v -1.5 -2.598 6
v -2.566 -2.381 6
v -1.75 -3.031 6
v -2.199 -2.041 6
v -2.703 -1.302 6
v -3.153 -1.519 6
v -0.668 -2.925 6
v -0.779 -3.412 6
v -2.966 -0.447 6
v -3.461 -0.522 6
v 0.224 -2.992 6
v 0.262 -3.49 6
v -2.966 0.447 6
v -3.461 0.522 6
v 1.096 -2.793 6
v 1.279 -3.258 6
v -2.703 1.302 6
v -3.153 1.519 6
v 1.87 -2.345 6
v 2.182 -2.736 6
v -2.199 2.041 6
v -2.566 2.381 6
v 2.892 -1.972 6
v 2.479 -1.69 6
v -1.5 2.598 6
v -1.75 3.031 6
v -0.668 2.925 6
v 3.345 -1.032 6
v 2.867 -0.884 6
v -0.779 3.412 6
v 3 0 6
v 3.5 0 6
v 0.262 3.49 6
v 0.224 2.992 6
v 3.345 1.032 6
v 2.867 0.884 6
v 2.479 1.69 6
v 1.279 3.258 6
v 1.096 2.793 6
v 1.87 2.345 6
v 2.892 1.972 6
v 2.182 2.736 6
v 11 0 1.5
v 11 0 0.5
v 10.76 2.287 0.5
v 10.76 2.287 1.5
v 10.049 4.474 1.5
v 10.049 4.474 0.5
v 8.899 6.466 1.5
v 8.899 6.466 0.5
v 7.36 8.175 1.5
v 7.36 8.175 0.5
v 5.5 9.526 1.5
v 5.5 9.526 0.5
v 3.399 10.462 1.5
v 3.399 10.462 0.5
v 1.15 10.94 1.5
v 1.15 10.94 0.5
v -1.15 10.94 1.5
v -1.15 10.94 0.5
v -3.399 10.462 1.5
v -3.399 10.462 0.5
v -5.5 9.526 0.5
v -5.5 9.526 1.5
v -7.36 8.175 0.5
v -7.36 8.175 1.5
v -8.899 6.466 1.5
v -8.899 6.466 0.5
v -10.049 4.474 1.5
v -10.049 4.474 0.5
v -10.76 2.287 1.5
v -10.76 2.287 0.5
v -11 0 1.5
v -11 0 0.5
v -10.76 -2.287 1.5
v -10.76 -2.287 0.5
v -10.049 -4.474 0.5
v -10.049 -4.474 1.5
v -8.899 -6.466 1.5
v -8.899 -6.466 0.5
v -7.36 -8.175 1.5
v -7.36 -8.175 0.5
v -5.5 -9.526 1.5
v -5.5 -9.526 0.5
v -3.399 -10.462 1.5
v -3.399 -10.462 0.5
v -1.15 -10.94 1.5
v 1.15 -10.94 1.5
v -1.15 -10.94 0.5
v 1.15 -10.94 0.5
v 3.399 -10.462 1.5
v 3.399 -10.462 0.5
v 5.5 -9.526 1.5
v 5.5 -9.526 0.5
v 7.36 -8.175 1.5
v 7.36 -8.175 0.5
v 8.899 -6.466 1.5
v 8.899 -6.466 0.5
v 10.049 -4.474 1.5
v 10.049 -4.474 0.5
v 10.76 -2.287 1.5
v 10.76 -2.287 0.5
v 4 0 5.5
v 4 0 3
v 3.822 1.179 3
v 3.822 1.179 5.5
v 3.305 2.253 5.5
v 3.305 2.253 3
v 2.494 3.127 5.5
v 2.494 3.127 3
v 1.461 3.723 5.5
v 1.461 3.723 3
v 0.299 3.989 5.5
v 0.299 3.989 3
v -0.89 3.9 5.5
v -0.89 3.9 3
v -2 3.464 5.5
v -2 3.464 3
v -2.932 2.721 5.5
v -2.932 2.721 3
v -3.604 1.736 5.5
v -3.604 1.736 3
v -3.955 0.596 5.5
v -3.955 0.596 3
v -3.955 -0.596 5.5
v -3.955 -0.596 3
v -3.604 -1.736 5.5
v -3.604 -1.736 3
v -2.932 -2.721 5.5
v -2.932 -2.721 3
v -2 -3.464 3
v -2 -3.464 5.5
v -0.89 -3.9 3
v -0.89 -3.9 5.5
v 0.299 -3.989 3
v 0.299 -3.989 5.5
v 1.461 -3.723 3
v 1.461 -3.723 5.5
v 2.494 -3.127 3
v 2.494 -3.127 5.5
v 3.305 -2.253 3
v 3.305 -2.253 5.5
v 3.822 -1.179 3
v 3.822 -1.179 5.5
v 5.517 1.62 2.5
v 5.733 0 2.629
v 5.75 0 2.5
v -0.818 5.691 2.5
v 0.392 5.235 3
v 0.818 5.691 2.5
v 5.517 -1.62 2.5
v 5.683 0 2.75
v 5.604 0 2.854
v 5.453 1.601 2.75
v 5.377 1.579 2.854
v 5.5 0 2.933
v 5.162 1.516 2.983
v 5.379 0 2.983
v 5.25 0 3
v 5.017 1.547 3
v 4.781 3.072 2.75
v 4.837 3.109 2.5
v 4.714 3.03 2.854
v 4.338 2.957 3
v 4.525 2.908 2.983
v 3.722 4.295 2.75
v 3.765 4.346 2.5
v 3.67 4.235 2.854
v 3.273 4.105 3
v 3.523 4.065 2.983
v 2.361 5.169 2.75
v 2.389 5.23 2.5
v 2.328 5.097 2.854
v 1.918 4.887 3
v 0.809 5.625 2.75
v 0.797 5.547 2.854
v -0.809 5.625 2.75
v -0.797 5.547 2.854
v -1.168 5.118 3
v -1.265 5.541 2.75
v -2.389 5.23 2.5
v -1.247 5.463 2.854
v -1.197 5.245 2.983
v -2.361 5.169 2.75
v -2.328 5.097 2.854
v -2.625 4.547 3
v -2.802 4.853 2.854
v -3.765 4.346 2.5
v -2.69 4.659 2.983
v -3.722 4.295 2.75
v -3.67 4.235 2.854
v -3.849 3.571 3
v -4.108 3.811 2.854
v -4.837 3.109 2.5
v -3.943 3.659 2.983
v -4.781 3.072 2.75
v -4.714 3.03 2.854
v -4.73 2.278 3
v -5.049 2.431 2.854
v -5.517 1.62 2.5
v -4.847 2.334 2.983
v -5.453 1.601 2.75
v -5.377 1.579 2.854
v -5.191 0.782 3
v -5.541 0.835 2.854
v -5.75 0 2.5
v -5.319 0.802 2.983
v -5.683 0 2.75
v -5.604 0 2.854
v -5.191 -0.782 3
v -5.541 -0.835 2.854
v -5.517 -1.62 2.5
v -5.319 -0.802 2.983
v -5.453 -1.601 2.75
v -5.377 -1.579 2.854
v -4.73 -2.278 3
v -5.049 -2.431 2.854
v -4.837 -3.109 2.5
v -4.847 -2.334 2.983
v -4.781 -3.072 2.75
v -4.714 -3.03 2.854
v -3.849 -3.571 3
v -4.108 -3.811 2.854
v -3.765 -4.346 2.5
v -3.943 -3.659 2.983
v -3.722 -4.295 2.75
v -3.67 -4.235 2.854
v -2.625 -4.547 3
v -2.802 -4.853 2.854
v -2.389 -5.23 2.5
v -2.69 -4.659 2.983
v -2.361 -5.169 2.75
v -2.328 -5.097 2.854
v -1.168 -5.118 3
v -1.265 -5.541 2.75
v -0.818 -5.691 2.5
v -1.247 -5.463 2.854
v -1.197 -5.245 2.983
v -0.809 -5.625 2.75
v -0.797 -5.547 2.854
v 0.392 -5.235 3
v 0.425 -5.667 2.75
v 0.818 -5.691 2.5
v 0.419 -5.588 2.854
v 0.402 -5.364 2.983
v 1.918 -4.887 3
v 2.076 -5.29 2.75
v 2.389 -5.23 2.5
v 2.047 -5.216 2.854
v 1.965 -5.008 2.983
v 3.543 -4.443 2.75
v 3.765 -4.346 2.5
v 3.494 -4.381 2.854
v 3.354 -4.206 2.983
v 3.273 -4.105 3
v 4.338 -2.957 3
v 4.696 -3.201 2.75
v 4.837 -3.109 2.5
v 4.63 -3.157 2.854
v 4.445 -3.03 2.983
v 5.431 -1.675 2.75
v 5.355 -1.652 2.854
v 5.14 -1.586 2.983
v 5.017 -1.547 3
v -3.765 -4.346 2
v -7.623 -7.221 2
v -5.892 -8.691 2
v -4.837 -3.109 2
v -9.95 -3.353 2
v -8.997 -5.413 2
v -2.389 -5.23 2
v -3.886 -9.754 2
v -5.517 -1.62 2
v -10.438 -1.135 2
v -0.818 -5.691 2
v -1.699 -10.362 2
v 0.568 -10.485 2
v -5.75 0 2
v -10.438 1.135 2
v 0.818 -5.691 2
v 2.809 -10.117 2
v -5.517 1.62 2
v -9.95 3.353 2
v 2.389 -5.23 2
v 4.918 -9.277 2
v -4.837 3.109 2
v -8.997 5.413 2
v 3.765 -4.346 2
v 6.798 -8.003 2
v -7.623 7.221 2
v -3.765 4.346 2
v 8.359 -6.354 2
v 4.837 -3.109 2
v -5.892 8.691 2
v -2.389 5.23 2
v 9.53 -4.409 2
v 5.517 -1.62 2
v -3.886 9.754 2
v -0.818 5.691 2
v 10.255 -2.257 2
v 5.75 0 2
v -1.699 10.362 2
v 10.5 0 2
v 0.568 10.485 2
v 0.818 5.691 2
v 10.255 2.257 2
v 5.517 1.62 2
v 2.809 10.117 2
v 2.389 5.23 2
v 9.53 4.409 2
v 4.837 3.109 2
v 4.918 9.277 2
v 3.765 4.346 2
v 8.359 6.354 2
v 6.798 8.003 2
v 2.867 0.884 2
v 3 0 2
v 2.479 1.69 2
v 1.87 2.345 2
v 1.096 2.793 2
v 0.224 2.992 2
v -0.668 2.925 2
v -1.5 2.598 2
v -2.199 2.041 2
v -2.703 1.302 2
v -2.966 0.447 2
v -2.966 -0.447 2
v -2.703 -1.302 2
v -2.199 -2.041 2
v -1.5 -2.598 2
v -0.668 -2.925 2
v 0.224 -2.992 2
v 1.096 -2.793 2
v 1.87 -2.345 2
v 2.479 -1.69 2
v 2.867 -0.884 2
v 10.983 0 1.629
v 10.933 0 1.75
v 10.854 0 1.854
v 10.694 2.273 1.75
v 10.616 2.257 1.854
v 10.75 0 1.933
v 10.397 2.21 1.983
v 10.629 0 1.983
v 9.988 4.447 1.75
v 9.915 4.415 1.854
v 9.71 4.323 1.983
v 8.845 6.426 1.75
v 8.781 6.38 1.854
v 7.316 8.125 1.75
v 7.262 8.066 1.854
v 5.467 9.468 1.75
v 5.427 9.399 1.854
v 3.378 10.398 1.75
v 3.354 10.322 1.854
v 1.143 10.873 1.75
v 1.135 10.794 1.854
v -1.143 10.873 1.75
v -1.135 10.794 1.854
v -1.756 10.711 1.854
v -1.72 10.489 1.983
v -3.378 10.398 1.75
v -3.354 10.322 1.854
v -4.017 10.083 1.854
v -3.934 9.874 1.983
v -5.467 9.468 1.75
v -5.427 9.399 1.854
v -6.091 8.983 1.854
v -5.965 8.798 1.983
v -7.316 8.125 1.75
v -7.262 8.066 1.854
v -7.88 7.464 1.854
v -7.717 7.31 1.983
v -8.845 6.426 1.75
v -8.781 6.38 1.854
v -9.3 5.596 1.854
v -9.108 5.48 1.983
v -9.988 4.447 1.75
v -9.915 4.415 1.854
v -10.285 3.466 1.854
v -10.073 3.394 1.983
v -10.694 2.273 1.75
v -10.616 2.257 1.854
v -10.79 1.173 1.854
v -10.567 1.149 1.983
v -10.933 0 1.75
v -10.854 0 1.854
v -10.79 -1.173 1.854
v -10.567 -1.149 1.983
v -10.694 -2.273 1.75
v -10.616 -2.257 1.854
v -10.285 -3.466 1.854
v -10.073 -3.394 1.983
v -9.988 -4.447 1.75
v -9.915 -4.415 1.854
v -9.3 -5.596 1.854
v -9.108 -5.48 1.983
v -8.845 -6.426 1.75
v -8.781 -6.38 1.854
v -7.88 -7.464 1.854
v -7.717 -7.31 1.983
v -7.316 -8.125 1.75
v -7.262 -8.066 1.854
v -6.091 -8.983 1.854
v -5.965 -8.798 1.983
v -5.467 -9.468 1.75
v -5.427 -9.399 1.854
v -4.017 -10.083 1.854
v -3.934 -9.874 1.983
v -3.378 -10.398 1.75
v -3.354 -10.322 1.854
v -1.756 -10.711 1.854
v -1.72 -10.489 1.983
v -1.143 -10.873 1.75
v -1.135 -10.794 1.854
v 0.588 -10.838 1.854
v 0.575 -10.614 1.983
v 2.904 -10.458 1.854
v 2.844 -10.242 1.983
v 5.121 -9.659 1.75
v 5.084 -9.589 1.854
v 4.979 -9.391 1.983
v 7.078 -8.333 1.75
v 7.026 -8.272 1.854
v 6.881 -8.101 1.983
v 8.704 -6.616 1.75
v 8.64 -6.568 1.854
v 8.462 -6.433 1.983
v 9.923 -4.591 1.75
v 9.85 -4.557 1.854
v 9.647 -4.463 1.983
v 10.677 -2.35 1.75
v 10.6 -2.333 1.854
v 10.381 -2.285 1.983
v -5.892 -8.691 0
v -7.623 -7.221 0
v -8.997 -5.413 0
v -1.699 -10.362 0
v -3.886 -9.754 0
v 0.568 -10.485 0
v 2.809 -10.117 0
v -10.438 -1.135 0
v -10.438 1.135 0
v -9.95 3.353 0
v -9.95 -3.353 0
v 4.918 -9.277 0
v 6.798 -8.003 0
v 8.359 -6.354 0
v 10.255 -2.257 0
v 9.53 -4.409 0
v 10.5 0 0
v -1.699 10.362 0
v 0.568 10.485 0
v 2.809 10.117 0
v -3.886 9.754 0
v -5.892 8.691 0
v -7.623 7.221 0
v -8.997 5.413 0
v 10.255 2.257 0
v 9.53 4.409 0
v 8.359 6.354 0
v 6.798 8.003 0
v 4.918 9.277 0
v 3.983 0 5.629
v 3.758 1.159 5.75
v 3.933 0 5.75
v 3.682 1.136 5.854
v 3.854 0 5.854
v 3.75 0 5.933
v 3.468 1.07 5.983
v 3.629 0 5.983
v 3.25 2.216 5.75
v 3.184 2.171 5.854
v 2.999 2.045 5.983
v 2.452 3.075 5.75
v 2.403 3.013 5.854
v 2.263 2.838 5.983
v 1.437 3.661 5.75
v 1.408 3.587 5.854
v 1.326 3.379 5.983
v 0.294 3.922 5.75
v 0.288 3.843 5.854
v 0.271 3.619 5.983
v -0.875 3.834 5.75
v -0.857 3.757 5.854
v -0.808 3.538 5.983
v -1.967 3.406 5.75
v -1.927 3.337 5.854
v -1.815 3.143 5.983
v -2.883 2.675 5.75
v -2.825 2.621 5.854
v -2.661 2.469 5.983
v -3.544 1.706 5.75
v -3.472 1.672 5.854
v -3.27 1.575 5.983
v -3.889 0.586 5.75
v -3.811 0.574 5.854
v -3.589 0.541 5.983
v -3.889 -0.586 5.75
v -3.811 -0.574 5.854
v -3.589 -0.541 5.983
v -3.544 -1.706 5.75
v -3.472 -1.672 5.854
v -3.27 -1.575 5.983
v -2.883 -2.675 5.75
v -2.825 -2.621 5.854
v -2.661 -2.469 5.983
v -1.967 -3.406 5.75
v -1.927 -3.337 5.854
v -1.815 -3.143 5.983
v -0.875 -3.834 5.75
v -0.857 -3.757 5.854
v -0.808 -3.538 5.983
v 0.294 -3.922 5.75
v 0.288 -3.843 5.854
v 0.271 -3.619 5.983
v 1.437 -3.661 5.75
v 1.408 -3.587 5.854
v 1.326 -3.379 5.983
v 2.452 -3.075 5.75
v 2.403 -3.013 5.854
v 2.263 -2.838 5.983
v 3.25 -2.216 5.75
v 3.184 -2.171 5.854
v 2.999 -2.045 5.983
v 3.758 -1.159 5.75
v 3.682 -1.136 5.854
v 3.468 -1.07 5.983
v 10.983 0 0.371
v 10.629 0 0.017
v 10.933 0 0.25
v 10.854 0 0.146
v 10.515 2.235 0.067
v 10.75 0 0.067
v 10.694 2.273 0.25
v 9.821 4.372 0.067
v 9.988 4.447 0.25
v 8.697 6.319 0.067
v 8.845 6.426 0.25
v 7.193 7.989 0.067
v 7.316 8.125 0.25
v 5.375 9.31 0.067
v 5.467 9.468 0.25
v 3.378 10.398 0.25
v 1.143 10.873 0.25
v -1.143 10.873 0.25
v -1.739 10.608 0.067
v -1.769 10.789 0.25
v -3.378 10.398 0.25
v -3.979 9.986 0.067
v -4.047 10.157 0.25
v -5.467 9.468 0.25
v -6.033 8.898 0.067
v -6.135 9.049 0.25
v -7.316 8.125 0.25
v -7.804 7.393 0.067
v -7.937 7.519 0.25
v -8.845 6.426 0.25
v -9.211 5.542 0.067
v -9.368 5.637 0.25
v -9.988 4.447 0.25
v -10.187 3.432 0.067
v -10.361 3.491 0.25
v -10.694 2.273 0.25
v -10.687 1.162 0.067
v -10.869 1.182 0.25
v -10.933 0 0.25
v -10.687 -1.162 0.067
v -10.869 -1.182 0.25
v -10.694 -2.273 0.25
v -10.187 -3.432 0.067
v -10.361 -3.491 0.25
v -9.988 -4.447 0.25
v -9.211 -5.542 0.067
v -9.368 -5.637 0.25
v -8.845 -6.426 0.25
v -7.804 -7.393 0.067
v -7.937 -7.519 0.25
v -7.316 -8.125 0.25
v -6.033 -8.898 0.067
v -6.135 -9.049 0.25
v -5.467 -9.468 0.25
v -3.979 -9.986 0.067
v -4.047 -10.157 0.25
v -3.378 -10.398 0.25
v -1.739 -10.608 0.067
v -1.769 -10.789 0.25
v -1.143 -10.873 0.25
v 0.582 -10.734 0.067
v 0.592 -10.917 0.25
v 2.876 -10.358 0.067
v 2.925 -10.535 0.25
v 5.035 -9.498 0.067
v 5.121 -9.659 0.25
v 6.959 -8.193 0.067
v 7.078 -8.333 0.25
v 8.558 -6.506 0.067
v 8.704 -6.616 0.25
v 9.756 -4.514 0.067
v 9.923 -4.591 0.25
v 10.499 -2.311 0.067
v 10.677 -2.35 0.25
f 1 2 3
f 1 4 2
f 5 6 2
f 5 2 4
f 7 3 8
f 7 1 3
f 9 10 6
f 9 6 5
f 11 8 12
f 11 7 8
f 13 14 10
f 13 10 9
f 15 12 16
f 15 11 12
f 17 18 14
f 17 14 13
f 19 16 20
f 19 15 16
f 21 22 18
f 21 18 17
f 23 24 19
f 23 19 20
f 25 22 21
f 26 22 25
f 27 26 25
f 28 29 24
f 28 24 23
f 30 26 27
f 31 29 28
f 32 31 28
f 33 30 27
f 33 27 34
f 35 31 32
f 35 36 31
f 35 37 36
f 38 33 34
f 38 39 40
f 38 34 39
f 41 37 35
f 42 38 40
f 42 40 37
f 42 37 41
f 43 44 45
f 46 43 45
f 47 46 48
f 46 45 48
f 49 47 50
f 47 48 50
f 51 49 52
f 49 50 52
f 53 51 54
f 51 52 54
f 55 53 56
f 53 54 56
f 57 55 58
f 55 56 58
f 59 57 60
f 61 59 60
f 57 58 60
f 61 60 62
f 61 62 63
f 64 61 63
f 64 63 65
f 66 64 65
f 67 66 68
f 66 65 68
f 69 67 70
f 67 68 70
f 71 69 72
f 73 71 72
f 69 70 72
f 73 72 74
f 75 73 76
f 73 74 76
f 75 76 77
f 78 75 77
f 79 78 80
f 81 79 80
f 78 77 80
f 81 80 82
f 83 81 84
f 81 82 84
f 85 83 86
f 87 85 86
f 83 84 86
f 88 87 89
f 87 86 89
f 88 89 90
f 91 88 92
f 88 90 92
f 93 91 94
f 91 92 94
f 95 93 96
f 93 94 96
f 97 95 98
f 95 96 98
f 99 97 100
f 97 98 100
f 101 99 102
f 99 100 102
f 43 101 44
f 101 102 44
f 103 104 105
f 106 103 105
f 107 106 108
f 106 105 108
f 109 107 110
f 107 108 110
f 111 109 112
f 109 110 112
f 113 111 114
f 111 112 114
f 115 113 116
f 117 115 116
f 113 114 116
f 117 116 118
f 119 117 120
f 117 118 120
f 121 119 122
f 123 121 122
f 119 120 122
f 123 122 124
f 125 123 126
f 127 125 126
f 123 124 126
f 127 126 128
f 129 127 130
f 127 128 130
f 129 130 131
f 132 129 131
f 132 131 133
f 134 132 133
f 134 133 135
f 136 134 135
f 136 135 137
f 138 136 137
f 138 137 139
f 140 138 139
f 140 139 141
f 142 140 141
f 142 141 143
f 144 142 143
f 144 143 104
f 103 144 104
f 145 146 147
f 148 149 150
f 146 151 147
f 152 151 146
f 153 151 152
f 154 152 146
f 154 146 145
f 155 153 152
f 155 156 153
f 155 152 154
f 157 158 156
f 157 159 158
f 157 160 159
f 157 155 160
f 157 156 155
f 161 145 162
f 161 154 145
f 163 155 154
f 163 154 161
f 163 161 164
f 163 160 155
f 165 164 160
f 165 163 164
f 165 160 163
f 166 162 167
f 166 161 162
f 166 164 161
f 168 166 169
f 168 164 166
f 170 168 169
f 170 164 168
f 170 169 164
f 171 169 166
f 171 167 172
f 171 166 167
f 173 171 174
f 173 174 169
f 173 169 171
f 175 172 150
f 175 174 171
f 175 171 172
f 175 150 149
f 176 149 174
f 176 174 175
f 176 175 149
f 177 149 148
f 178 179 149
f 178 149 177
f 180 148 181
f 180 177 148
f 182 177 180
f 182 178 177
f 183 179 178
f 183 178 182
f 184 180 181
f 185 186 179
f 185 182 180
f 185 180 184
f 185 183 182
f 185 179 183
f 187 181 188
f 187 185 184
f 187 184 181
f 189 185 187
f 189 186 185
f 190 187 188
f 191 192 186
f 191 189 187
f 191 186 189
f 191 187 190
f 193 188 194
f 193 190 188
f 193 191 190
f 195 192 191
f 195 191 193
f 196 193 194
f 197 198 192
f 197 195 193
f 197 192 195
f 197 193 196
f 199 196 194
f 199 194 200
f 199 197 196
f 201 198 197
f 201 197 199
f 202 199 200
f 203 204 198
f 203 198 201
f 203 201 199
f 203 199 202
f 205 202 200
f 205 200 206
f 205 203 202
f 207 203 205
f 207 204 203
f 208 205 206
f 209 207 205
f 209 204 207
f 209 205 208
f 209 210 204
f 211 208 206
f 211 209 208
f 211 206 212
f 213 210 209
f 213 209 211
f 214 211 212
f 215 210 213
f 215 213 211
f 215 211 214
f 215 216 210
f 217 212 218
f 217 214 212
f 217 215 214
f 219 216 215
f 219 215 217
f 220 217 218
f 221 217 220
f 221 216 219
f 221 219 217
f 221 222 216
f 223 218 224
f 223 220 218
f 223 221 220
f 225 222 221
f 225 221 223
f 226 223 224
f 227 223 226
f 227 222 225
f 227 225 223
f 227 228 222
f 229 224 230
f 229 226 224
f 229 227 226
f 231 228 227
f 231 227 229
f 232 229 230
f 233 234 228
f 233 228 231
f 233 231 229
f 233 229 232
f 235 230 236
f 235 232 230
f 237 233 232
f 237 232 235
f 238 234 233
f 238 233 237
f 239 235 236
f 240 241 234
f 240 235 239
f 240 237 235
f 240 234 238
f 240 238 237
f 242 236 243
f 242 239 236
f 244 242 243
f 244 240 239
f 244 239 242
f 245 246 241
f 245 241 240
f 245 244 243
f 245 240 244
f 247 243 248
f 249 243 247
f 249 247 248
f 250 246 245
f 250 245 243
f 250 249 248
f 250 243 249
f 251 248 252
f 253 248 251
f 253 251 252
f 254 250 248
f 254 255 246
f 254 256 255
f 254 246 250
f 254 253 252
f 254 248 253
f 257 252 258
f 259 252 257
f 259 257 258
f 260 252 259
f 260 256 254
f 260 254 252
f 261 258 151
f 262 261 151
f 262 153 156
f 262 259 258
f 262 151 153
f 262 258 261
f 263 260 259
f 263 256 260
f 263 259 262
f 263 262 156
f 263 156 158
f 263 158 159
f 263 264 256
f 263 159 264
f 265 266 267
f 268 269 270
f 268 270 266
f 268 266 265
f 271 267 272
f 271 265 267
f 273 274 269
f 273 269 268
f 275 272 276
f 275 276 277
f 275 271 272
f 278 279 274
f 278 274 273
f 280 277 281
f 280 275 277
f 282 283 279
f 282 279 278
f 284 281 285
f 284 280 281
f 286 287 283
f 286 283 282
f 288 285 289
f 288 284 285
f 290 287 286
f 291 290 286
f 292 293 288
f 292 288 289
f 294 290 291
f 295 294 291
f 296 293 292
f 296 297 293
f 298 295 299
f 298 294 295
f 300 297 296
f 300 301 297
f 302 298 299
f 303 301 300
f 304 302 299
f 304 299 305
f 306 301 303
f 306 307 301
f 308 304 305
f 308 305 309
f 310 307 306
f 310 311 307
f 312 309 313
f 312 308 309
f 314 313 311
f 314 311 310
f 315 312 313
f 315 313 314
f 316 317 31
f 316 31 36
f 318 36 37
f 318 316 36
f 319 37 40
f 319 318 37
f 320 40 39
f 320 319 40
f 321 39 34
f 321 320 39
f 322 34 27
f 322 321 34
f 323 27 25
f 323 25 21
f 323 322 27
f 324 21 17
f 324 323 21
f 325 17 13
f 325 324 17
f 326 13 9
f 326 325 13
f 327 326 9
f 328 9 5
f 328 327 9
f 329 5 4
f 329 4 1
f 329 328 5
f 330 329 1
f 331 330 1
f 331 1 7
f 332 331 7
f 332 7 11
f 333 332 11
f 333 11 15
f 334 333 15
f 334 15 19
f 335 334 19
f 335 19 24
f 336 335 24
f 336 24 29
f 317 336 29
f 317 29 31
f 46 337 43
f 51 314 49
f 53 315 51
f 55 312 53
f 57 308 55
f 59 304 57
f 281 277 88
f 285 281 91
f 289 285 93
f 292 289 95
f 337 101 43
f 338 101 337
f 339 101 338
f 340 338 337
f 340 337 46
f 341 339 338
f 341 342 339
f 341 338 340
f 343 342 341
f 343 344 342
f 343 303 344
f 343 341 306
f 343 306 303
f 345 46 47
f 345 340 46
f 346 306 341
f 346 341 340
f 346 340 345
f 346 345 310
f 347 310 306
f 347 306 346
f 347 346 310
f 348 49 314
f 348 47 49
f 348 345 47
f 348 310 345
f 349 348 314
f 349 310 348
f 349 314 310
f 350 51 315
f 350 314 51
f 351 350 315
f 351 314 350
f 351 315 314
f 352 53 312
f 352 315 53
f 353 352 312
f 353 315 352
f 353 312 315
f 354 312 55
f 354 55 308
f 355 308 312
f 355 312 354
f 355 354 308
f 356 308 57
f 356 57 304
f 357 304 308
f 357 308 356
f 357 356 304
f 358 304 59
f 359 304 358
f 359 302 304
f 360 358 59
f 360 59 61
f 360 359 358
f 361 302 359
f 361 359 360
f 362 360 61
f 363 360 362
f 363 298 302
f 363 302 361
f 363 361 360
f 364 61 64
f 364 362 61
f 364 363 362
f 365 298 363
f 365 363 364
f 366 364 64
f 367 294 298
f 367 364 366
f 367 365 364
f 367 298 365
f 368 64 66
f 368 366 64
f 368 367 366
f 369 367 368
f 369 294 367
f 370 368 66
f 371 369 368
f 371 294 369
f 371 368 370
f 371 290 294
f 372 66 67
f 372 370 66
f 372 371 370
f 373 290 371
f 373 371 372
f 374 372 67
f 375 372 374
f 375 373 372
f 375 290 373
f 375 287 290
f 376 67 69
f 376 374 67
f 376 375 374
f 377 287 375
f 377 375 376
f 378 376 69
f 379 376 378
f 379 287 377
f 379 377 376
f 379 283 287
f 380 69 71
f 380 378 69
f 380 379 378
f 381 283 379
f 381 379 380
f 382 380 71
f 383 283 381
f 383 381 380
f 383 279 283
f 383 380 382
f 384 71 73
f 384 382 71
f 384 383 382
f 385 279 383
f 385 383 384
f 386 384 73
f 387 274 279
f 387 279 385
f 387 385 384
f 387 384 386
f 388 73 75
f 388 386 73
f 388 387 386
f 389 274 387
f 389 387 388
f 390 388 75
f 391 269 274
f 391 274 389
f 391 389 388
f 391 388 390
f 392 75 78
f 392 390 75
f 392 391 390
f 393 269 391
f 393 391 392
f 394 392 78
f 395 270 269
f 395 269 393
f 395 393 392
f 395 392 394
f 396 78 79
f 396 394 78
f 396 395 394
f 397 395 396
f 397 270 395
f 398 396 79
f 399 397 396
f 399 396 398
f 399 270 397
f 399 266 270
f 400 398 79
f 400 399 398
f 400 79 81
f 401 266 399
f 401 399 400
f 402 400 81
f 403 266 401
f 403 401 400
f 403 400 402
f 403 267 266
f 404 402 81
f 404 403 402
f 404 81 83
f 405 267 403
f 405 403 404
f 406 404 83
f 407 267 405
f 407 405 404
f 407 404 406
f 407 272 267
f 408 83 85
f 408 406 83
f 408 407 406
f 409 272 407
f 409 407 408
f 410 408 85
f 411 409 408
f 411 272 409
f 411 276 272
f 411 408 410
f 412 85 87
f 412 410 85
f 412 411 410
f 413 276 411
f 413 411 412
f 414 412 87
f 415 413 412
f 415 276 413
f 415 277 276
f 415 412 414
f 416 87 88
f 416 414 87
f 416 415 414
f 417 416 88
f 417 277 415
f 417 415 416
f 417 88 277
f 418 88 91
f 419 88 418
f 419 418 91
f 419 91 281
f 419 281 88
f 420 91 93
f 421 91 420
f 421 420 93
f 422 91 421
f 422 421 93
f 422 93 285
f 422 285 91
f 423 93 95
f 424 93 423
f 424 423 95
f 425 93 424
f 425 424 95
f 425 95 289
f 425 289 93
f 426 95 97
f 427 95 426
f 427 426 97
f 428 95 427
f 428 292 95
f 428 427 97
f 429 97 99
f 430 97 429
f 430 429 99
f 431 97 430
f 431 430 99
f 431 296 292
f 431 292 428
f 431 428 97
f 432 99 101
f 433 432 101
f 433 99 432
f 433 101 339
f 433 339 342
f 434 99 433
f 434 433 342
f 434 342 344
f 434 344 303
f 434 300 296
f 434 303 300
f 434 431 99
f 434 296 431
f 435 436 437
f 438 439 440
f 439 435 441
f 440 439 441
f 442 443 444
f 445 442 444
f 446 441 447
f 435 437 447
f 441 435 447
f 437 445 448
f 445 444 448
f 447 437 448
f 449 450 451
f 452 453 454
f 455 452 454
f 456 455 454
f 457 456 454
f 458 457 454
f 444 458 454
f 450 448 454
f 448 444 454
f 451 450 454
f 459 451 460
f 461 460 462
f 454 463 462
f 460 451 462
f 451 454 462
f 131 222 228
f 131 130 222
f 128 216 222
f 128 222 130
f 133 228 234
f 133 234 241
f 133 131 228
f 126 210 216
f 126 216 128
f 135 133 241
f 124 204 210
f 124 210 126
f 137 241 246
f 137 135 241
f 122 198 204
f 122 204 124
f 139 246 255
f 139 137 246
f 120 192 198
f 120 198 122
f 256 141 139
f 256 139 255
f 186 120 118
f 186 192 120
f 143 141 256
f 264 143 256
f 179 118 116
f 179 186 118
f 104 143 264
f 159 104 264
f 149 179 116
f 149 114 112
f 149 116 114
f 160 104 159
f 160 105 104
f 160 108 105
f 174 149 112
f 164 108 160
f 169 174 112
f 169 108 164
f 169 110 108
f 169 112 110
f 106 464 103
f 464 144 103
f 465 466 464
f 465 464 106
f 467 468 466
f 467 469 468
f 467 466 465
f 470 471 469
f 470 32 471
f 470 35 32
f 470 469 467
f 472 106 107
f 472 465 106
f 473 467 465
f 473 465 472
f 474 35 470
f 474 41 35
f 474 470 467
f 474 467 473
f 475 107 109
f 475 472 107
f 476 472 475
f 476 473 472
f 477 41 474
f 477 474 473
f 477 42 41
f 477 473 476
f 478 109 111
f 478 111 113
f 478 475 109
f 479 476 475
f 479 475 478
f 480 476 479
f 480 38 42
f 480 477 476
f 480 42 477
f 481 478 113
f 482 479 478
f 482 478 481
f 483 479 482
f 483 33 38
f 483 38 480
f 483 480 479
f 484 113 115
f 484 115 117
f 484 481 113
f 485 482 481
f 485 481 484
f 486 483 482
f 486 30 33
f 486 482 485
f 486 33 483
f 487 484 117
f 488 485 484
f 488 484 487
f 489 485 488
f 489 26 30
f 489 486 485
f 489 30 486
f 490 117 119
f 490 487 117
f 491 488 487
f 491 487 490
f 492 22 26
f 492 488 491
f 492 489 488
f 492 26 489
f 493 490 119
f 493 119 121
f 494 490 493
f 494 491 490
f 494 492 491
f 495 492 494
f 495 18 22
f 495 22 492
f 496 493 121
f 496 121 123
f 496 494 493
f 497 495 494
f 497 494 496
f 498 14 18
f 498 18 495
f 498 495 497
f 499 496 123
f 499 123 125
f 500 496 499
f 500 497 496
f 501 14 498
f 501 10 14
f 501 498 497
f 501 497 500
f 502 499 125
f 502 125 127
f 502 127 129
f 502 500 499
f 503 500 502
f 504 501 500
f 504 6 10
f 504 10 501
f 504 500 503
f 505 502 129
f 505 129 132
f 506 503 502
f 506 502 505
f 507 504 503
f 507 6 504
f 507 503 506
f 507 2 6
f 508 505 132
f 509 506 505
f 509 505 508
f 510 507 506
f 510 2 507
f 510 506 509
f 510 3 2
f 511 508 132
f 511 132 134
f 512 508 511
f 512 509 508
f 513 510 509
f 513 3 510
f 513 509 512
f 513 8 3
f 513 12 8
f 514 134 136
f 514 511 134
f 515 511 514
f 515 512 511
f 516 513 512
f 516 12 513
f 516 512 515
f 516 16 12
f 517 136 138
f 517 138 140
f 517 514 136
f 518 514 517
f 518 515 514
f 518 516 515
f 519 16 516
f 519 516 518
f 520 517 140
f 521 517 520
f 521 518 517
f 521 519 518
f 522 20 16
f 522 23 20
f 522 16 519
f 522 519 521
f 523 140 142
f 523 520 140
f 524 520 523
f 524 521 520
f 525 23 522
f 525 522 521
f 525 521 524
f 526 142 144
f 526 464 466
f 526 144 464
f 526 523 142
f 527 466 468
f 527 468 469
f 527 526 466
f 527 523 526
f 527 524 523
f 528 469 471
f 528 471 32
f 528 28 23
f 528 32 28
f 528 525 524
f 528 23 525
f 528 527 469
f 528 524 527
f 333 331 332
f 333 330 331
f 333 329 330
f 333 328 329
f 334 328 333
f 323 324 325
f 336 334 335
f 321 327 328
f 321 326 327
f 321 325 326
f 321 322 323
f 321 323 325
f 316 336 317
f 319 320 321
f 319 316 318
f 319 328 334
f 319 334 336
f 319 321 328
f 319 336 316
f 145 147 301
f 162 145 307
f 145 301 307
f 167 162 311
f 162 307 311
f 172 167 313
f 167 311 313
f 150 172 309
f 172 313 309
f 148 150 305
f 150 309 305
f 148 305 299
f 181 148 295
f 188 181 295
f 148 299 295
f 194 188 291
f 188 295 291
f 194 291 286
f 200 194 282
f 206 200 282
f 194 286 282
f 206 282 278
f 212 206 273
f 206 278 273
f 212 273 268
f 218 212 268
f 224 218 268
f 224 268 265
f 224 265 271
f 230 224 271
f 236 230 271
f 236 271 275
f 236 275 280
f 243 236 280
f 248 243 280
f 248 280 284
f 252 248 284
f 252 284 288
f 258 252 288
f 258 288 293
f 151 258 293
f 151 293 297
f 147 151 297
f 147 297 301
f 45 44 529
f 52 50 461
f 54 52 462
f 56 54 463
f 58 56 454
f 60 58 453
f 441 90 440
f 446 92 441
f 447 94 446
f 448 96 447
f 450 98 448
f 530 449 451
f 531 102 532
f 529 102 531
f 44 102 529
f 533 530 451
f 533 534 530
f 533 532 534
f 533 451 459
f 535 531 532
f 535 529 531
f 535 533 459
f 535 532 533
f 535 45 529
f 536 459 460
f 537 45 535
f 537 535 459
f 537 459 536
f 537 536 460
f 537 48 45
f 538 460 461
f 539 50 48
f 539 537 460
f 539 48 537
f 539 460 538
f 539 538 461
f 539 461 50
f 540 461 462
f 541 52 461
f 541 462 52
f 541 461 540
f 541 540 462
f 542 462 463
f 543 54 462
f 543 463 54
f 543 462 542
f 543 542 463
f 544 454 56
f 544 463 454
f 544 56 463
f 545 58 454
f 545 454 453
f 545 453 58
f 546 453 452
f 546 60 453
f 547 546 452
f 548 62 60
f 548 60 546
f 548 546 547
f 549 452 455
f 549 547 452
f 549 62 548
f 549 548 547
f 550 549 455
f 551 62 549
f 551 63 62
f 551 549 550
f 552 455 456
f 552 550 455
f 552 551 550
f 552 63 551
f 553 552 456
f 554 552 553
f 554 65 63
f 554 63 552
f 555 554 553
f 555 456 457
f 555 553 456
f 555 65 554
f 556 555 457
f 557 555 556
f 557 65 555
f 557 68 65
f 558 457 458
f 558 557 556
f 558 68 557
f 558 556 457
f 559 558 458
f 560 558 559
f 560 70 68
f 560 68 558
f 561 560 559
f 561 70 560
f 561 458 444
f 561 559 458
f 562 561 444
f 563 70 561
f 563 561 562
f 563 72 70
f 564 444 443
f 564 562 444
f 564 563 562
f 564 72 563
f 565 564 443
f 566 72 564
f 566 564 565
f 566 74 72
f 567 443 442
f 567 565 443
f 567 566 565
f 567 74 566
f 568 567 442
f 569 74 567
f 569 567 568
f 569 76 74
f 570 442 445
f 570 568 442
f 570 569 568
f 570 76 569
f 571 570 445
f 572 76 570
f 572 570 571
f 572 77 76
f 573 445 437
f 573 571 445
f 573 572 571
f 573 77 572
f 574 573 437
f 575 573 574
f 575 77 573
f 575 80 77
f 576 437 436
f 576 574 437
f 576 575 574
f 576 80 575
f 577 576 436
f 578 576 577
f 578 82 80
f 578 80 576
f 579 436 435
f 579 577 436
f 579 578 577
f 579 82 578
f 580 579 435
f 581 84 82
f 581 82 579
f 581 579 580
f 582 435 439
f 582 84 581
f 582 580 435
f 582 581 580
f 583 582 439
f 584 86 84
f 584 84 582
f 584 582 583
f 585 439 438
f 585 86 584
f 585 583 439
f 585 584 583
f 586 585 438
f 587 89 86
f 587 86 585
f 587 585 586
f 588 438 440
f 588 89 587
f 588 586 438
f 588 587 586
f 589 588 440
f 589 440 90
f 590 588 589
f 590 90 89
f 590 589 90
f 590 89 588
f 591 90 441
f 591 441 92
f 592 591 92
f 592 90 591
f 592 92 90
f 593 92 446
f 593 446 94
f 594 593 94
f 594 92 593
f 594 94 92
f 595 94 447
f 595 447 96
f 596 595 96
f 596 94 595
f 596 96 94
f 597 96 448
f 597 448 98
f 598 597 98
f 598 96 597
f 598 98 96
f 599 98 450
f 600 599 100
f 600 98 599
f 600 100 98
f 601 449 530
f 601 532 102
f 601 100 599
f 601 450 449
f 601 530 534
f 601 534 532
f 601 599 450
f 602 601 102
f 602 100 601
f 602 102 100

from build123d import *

# Parameters (mm, degrees)
F0_R     = 11
F0_R_2   = 5.75
F0_R_3   = 4
F0_R_4   = 3
F1_DEPTH = 2
F2_DEPTH = 3
F3_DEPTH = 6
F4_R     = 0.5


with BuildPart() as f1:
    # F0 (on Top) → F1 (new body)
    with BuildSketch(Plane.XY):
        Circle(F0_R)
        Circle(F0_R_2, mode=Mode.SUBTRACT)
        Circle(F0_R_2)
        Circle(F0_R_3, mode=Mode.SUBTRACT)
        Circle(F0_R_3)
        Circle(F0_R_4, mode=Mode.SUBTRACT)
        Circle(F0_R_4)
    extrude(amount=F1_DEPTH)

    # F0 (on Top) → F2 (join)
    with BuildSketch(Plane.XY):
        Circle(F0_R_2)
        Circle(F0_R_3, mode=Mode.SUBTRACT)
    extrude(amount=F2_DEPTH)

    # F0 (on Top) → F3 (join)
    with BuildSketch(Plane.XY):
        Circle(F0_R_3)
        Circle(F0_R_4, mode=Mode.SUBTRACT)
    extrude(amount=F3_DEPTH)

    # F4
    f4_edges = [f1.edges().sort_by_distance(p)[0] for p in [
        (-4, 0, 6),
        (-5.75, 0, 3),
        (-11, 0, 2),
        (-11, 0, 0),
    ]]
    fillet(f4_edges, radius=F4_R)


solid = f1.part
